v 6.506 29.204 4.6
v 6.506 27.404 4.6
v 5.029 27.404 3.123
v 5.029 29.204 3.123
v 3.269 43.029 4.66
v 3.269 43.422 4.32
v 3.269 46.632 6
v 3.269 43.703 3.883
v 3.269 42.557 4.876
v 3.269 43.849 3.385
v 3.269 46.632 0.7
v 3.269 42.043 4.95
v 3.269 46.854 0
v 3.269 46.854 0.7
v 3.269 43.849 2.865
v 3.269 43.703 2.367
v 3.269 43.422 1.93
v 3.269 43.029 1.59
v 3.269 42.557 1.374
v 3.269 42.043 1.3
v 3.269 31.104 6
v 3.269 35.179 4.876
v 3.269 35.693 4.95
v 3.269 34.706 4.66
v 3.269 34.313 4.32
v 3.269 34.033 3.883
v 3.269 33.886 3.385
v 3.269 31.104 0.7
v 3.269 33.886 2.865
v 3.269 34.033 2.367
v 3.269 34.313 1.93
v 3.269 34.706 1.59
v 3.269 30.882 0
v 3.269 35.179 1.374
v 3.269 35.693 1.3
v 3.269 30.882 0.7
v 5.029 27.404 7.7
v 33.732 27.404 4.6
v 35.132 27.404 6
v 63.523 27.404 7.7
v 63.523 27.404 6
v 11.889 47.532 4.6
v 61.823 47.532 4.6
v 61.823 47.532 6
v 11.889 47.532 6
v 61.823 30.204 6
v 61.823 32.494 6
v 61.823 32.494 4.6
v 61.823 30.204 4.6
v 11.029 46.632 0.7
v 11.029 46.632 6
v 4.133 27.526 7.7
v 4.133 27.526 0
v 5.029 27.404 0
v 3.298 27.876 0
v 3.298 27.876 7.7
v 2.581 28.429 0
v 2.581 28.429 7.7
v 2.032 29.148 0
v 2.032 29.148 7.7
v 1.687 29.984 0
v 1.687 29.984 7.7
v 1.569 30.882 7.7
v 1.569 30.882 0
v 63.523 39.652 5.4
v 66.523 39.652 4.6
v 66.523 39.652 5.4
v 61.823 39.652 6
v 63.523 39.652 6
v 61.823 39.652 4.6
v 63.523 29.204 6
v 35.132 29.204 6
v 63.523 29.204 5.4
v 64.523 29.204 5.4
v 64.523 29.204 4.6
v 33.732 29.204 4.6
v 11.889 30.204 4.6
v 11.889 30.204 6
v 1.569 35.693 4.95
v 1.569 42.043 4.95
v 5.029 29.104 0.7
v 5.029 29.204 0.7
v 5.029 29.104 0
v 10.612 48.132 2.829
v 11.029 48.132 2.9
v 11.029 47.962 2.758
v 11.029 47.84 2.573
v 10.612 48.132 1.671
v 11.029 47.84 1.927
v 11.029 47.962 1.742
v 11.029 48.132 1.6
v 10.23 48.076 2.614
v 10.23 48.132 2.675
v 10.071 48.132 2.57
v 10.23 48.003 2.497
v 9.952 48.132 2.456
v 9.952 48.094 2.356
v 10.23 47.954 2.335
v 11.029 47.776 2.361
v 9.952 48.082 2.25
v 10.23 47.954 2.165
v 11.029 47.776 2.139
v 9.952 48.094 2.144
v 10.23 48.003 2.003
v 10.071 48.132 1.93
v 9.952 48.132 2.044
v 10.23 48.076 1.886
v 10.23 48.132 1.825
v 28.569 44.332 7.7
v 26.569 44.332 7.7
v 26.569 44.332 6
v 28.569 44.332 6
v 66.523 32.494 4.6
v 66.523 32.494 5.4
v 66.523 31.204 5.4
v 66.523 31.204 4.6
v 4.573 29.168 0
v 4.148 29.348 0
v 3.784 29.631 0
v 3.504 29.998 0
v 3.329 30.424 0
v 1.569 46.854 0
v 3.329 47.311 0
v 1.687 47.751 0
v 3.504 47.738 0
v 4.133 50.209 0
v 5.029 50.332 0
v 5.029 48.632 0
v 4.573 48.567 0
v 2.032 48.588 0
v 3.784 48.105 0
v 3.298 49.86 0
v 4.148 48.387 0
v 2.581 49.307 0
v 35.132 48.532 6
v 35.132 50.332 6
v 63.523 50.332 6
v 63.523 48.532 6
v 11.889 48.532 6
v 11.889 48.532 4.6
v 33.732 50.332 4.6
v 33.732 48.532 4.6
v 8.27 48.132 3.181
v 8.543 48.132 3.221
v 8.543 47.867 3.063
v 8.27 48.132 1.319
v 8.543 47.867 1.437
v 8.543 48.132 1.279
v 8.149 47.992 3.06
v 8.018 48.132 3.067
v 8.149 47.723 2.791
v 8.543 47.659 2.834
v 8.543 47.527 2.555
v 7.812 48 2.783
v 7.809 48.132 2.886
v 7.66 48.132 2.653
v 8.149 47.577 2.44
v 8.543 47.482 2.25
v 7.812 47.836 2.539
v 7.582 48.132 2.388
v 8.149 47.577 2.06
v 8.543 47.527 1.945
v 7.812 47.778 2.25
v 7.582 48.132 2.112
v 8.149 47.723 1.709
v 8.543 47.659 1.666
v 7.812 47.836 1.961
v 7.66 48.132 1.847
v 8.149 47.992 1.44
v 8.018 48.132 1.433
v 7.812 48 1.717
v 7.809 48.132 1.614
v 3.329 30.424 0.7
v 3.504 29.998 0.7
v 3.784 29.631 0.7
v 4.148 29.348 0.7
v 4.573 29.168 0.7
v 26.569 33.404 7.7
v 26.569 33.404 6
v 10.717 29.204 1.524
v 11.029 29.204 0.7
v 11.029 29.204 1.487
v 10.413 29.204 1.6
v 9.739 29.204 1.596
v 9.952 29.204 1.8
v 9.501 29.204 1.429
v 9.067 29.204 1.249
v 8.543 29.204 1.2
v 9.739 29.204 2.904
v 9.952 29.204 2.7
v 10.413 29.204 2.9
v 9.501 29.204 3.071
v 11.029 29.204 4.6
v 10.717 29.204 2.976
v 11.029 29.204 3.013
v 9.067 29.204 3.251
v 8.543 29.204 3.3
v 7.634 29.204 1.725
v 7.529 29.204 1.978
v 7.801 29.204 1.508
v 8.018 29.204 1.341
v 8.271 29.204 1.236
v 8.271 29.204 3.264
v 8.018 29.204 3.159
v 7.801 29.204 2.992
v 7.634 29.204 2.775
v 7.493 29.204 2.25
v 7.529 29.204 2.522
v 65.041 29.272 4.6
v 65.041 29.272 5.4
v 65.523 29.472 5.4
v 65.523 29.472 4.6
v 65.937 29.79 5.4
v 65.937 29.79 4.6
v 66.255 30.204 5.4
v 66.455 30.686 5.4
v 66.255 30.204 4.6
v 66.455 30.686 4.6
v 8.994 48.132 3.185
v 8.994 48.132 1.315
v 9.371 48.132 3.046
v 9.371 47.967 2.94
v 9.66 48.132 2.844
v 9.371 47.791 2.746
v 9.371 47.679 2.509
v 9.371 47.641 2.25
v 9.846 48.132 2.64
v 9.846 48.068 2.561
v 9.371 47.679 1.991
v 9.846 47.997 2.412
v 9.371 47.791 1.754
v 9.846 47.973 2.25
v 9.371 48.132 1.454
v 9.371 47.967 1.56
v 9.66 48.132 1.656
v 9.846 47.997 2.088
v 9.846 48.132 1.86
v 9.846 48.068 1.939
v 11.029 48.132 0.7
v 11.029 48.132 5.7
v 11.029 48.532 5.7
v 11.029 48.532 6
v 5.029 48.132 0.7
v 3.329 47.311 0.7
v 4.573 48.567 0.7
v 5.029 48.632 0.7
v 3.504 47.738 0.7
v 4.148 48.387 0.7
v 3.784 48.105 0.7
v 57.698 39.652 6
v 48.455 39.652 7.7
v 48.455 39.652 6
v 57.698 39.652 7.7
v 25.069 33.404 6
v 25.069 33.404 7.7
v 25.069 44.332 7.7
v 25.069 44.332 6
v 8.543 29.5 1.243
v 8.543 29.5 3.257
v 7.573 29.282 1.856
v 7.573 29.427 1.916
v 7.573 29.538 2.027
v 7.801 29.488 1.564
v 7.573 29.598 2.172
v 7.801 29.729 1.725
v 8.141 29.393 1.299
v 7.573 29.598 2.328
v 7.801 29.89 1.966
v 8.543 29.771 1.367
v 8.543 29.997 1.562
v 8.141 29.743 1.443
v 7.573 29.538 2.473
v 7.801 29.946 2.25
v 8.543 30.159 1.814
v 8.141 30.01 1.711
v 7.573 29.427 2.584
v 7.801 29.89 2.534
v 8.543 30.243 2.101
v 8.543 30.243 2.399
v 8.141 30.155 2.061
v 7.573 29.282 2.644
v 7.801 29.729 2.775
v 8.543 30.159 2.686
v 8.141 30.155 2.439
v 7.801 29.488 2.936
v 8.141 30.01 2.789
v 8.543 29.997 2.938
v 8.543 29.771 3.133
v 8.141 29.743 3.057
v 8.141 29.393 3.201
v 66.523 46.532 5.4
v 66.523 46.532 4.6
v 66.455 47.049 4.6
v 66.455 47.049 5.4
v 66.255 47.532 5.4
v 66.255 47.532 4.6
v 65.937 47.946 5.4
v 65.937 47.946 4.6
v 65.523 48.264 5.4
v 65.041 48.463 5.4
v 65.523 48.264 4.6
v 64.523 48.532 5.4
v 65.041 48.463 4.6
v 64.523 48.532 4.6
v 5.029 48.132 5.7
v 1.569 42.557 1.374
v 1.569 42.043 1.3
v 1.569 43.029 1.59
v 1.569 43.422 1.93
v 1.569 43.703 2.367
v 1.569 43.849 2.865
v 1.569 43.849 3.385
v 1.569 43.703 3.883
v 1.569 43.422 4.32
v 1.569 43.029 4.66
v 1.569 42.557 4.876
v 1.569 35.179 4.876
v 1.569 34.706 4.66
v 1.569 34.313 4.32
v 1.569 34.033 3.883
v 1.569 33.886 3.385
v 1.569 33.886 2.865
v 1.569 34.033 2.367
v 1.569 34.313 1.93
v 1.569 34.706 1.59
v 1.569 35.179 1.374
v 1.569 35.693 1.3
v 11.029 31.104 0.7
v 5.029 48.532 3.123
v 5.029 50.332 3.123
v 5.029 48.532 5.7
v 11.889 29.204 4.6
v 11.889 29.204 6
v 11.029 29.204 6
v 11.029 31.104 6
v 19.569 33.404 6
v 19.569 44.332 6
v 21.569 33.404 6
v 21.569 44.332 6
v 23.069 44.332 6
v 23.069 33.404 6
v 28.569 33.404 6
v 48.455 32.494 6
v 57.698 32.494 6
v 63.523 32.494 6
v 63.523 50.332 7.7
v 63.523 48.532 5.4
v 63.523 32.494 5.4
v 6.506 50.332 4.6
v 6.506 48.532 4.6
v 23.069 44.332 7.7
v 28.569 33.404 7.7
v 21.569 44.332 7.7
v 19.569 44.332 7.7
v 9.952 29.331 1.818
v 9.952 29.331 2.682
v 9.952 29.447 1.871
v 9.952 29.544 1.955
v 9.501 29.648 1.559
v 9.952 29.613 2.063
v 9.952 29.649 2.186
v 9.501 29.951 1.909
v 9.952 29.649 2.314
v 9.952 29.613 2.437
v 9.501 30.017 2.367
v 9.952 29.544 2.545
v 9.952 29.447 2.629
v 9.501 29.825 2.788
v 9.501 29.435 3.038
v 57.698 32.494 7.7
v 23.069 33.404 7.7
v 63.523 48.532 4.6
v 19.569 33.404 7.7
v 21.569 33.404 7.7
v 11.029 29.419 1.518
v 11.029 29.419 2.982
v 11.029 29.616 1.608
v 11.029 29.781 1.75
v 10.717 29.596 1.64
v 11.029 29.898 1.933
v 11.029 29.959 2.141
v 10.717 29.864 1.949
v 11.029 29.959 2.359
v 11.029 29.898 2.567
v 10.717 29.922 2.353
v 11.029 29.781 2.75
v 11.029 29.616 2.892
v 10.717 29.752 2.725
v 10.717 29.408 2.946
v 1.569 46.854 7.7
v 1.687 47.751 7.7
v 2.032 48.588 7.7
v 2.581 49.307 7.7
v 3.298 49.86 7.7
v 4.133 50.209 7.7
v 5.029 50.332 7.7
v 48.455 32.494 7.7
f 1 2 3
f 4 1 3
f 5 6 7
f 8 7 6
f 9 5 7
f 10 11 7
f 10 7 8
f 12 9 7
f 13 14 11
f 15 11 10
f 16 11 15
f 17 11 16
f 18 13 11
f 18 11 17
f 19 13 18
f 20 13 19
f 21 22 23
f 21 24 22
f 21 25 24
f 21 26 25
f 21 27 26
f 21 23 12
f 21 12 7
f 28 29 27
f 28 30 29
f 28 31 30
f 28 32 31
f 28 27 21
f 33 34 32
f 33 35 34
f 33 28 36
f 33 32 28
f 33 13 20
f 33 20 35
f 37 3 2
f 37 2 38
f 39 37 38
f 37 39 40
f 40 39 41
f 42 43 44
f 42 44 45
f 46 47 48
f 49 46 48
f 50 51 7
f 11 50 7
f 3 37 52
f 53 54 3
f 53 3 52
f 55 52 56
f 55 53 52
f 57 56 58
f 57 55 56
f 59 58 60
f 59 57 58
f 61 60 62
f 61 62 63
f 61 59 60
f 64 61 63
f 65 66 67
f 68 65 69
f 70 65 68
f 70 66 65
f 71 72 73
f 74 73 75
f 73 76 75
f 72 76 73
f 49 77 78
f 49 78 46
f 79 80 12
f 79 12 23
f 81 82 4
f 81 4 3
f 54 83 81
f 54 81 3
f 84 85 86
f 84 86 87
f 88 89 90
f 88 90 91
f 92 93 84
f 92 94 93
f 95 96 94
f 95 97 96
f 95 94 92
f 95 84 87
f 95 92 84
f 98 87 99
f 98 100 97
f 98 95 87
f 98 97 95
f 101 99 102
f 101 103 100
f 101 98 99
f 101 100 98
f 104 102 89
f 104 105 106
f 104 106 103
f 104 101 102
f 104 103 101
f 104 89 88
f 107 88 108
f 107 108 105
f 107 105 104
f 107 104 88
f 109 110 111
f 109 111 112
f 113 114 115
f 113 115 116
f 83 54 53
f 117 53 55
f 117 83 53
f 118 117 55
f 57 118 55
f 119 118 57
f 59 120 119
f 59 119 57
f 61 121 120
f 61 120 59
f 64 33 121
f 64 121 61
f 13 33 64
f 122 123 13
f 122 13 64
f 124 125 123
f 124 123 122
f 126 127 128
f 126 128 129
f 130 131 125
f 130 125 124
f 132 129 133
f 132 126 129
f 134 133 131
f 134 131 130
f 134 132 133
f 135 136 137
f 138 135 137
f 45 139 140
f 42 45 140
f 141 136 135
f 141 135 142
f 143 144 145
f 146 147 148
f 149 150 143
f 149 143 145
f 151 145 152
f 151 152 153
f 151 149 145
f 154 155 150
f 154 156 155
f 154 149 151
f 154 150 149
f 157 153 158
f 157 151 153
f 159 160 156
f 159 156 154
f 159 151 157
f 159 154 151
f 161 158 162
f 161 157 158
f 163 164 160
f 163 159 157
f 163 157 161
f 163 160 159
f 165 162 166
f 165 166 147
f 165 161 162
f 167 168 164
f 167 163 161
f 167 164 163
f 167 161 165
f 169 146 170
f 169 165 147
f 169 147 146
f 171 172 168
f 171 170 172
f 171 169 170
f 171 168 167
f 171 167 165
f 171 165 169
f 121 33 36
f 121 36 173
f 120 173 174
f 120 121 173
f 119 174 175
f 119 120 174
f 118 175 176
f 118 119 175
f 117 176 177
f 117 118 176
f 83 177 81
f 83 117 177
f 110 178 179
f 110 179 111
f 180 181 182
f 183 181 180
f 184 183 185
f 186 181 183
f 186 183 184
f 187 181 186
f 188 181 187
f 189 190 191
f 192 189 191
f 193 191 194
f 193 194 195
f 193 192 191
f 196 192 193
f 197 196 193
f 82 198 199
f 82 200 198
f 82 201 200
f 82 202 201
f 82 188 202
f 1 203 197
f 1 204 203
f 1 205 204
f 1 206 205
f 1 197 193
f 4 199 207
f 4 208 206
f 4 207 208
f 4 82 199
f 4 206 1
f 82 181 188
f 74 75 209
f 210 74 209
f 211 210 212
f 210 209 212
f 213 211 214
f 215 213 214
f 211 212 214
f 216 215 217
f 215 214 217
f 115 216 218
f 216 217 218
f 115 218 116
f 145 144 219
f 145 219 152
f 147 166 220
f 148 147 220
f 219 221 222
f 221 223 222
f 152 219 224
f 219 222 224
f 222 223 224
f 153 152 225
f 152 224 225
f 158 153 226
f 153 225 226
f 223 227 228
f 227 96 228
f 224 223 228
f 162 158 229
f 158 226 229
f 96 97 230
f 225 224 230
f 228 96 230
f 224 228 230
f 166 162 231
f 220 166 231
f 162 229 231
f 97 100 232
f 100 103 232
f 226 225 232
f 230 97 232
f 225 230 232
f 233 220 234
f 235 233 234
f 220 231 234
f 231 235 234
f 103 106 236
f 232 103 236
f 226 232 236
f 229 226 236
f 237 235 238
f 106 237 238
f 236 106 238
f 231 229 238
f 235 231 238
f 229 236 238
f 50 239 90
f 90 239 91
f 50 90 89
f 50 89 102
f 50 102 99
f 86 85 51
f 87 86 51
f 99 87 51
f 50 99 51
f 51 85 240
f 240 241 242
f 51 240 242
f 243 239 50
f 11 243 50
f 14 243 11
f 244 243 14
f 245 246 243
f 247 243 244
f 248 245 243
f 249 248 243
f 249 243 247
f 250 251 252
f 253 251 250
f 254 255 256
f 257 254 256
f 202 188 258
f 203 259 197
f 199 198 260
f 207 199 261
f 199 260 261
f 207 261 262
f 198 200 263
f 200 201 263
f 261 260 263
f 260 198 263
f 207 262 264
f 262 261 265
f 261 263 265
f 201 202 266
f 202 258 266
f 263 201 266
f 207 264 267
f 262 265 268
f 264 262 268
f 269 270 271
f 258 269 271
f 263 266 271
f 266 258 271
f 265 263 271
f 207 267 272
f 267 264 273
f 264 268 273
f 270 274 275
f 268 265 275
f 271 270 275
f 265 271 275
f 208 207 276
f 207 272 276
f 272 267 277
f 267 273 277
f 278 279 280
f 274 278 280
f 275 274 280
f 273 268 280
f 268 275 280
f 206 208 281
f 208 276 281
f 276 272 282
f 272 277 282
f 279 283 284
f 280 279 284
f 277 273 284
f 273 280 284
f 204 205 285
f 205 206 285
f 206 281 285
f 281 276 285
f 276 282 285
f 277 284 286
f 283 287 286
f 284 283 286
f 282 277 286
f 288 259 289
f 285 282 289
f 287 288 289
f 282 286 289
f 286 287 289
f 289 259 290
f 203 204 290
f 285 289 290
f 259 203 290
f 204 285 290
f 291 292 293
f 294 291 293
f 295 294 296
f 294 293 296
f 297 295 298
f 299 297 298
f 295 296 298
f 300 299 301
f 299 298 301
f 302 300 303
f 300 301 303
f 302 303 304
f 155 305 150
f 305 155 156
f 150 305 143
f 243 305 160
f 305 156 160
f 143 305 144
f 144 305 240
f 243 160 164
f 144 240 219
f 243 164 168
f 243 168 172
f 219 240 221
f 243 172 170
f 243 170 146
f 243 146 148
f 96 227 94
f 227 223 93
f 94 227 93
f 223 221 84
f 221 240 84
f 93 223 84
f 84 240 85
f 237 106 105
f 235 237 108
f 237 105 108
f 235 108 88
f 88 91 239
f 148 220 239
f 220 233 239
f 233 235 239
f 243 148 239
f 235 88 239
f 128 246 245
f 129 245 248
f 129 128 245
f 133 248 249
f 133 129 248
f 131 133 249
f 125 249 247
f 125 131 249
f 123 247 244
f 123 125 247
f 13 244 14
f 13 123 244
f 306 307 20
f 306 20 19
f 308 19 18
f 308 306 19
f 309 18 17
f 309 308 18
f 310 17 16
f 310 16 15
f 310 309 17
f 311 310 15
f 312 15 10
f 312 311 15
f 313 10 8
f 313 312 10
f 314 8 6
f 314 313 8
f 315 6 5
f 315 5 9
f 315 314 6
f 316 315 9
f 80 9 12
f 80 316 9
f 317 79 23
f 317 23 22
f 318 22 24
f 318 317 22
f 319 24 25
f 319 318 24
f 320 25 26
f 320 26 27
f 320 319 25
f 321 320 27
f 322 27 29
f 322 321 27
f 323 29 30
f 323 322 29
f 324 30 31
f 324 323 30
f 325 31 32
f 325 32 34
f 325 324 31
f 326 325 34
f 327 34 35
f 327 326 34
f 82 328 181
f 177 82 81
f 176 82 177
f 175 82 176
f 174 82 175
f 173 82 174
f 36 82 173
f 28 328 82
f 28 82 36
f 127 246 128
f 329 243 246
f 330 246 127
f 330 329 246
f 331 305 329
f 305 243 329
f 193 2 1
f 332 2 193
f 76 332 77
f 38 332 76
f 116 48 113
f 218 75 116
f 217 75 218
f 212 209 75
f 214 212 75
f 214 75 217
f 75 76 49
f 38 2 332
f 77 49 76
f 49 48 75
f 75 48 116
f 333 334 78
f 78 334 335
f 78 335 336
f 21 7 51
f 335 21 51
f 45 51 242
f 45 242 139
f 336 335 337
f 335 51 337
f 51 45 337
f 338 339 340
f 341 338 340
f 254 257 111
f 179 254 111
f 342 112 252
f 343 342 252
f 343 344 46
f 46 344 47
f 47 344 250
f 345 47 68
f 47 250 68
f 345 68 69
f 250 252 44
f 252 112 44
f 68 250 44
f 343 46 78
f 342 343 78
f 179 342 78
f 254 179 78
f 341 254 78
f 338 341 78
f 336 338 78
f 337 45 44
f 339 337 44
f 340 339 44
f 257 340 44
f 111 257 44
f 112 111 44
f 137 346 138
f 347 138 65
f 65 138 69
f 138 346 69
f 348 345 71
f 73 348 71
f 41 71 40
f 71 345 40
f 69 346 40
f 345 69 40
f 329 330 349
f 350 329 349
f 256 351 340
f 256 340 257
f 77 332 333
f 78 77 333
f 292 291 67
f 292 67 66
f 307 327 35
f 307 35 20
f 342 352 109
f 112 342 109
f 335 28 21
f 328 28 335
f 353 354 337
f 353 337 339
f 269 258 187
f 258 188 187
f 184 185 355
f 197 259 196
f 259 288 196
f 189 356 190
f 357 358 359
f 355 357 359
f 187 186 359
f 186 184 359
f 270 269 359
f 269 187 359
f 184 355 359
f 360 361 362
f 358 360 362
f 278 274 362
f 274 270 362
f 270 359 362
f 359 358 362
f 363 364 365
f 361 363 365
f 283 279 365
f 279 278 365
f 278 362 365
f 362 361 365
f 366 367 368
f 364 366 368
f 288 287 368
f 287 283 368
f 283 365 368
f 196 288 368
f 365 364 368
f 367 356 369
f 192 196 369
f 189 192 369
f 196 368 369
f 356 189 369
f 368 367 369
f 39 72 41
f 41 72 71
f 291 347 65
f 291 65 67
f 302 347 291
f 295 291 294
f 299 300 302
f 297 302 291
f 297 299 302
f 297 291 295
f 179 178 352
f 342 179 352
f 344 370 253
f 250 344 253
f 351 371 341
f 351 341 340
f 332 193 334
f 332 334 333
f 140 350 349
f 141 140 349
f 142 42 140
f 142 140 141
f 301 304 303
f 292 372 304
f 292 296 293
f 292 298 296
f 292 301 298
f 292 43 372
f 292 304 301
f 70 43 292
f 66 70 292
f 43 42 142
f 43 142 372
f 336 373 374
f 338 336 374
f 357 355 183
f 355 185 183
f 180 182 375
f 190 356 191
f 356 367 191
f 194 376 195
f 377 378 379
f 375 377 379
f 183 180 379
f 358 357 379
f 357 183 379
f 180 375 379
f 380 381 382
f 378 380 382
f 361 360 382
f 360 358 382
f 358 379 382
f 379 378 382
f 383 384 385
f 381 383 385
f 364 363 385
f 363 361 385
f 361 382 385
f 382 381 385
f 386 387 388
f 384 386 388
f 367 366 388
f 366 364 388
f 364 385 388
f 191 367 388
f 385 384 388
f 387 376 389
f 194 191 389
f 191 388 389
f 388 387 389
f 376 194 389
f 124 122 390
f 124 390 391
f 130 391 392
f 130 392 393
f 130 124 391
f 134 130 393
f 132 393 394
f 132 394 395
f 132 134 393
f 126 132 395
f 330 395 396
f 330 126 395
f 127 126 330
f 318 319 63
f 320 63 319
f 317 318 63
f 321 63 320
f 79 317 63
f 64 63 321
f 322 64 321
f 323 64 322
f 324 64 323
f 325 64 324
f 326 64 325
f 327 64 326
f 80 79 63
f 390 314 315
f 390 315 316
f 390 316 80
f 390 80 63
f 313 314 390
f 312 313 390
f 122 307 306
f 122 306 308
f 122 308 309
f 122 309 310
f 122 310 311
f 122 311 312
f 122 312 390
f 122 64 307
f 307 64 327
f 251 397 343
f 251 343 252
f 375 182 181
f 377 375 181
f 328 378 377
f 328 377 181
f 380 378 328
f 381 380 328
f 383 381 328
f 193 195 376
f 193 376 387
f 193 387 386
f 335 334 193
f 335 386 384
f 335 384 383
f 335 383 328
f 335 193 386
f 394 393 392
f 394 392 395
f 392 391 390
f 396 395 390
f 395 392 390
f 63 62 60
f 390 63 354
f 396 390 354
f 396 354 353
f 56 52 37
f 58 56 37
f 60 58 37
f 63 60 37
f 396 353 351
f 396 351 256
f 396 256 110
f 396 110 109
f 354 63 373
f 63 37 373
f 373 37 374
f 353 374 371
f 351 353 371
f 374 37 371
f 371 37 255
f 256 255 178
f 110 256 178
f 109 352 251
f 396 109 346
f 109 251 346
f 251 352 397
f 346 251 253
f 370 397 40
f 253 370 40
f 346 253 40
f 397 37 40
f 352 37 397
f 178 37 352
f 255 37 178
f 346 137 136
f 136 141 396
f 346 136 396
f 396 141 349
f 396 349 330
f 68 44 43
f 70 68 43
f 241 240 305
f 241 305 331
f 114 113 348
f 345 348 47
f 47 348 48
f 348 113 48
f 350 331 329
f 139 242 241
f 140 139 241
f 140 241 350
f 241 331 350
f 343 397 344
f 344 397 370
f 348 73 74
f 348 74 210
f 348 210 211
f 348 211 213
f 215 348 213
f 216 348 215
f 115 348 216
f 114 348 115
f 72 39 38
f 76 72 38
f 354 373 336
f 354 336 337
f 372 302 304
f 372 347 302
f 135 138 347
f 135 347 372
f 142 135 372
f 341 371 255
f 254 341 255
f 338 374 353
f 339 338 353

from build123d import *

# Parameters (mm, degrees)
BOSS_EXTRUDE2_DEPTH       = 7.7
BOSS_EXTRUDE3_DEPTH       = 58.493998982
BOSS_EXTRUDE4_REACH       = 69.972
SKETCH7_W                 = 6
SKETCH7_H                 = 7
BOSS_EXTRUDE5_DEPTH       = 1.9
SKETCH9_W                 = 5
SKETCH9_H                 = 0.4
CUT_EXTRUDE1_DEPTH        = 6
SKETCH10_W                = 51.633694728
SKETCH10_H                = 3.1
BOSS_EXTRUDE6_DEPTH       = 1
MIRROR1_START             = 27.403764687
MIRROR1_DEPTH             = 2.800044537
MIRROR1_START_2           = 29.203809224
MIRROR1_2_DEPTH           = 1
MIRROR1_START_3           = 30.203809224
MIRROR1_3_OUTLINE_W       = 6
MIRROR1_3_OUTLINE_H       = 7
MIRROR1_3_DEPTH           = 0.9
MIRROR1_4_OUTLINE_W       = 0.860304254
MIRROR1_4_OUTLINE_H       = 3.1
MIRROR1_4_DEPTH           = 1.800044537
MIRROR1_START_4           = 5.029168405
MIRROR1_5_OUTLINE_W       = 1
MIRROR1_5_OUTLINE_H       = 3.9
MIRROR1_5_DEPTH           = 6
BOSS_EXTRUDE7_START       = -1.7
BOSS_EXTRUDE7_DEPTH       = 1.7
BOSS_EXTRUDE12_DEPTH      = 3
BOSS_EXTRUDE12_DEPTH_BACK = 1.7
SKETCH14_W                = 1.4
SKETCH14_H                = 19.327817751
FILLET1_R                 = 2
CUT_EXTRUDE2_DEPTH        = 0.6
CUT_EXTRUDE3_DEPTH        = 1.7
SKETCH18_W                = 2
SKETCH18_H                = 2.1
BOSS_EXTRUDE13_DEPTH      = 5.3
SKETCH19_W                = 9.243692919
SKETCH19_H                = 7.158225614
CUT_EXTRUDE4_DEPTH        = 1.7
SKETCH20_W                = 4.7
SKETCH20_H                = 7.158225614
CUT_EXTRUDE5_DEPTH        = 1.4
SKETCH21_W                = 2
SKETCH21_H                = 10.927906825
CUT_EXTRUDE6_DEPTH        = 84.772901086


with BuildPart() as part:
    # Sketch1 → Boss-Extrude2 (new body)
    with BuildSketch(Plane.XY):
        with BuildLine():
            Line((1.569168405, 30.881718108), (1.569168405, 46.853718091))
            ThreePointArc((1.569168405, 46.853718091), (2.581495272, 49.306663259), (5.029168405, 50.331671512))
            Line((5.029168405, 50.331671512), (5.029168405, 48.631626975))
            ThreePointArc((5.029168405, 48.631626975), (3.783584613, 48.104573798), (3.269168405, 46.853718091))
            Line((3.269168405, 46.853718091), (3.269168405, 30.881718108))
            ThreePointArc((3.269168405, 30.881718108), (3.783584613, 29.630862401), (5.029168405, 29.103809224))
            Line((5.029168405, 29.103809224), (5.029168405, 27.403764687))
            ThreePointArc((5.029168405, 27.403764687), (2.581495272, 28.428772939), (1.569168405, 30.881718108))
        make_face()
    extrude(amount=BOSS_EXTRUDE2_DEPTH)

    # Sketch3 → Boss-Extrude3 (add)
    with BuildSketch(Plane(origin=(5.029168405, 0, 0), x_dir=(0, 0, -1), z_dir=(1, 0, 0))):
        Polygon((-7.7, 48.631626975), (-7.7, 50.331671512), (-6.1, 50.331671512), (-6.1, 48.631626975), (-6.1, 48.531626975), (-7.7, 48.531626975), align=None)
    extrude(amount=BOSS_EXTRUDE3_DEPTH)

    # Boss-Extrude4: up to this face of the body (flat: up to its plane)
    boss_extrude4_end = Plane(part.part.faces().sort_by_distance((34.276167896, 48.531626975, 6.9))[0])
    # Sketch4 → Boss-Extrude4 (add, up to the picked face)
    with BuildSketch(Plane(origin=(0, 50.331671512, 0), x_dir=(1, 0, 0), z_dir=(0, 1, 0)), mode=Mode.PRIVATE) as boss_extrude4_sk1:
        Polygon((35.231704884, -6.1), (5.029168405, -6.1), (5.029168405, -3.123421356), (6.505747049, -4.6), (33.731704884, -4.6), (35.202415562, -6.070710678), align=None)
    boss_extrude4_tool1 = split(extrude(boss_extrude4_sk1.sketch, amount=-BOSS_EXTRUDE4_REACH, mode=Mode.PRIVATE), bisect_by=boss_extrude4_end, keep=Keep.BOTH, mode=Mode.PRIVATE)
    add(boss_extrude4_tool1.solids().sort_by(Axis((19.415766, 50.331672, 5.326299), (0, -1, 0)))[0])

    # Sketch7 → Boss-Extrude5 (add)
    with BuildSketch(Plane.XZ.offset(-48.531626975)):
        with Locations((8.029168405, 4.2)):
            Rectangle(SKETCH7_W, SKETCH7_H)
    extrude(amount=BOSS_EXTRUDE5_DEPTH)

    # Sketch8 → Cut-Revolve1 (revolve, cut)
    with BuildSketch(Plane(origin=(0, 48.531626975, 0), x_dir=(1, 0, 0), z_dir=(0, 1, 0))):
        with BuildLine():
            Line((7.493162671, -2.25), (9.593162671, -2.25))
            Line((9.593162671, -2.25), (11.029168405, -2.25))
            Line((11.029168405, -2.25), (11.029168405, -3.013237094))
            add(Edge.make_bspline(
                [(11.029168405, -3.013237094), (10.455622255, -2.979221008), (9.952164105, -2.7)],
                knots=[0, 0, 0, 1, 1, 1], degree=2))
            add(Edge.make_bspline(
                [(8.543162671, -3.3), (9.366293549, -3.339525323), (9.952164105, -2.7)],
                knots=[0, 0, 0, 1, 1, 1], degree=2))
            ThreePointArc((8.543162671, -3.3), (7.800700551, -2.99246212), (7.493162671, -2.25))
        make_face()
    revolve(axis=Axis((7.493162671, 48.531626975, 2.25), (1, 0, 0)), mode=Mode.SUBTRACT)

    # Sketch9 → Cut-Extrude1 (cut)
    with BuildSketch(Plane(origin=(11.029168405, 0, 0), x_dir=(0, 0, -1), z_dir=(1, 0, 0))):
        with Locations((-3.2, 48.331626975)):
            Rectangle(SKETCH9_W, SKETCH9_H)
    extrude(amount=-CUT_EXTRUDE1_DEPTH, mode=Mode.SUBTRACT)

    # Sketch10 → Boss-Extrude6 (add)
    with BuildSketch(Plane(origin=(0, 48.531626975, 0), x_dir=(-1, 0, 0), z_dir=(0, -1, 0))):
        with Locations((-37.706320023, -6.15)):
            Rectangle(SKETCH10_W, SKETCH10_H)
    extrude(amount=BOSS_EXTRUDE6_DEPTH)

    # Mirror1: read off the stored shape, not the designer's step
    # Mirror1 outline → Mirror1 (add)
    with BuildSketch(Plane(origin=(0, 0, 0), x_dir=(1, 0, 0), z_dir=(0, 1, 0)).offset(MIRROR1_START)):
        Polygon((63.523167387, -7.7), (63.523167387, -6.1), (35.231704884, -6.1), (33.731704884, -4.6), (11.889472659, -4.6), (11.889472659, -7.7), align=None)
        Polygon((5.029168405, -7.7), (11.029168405, -7.7), (11.029168405, -4.6), (6.505747049, -4.6), (5.029168405, -3.123421356), align=None)
    extrude(amount=MIRROR1_DEPTH)

    # Mirror1 2 outline → Mirror1 2 (add)
    with BuildSketch(Plane(origin=(0, 0, 0), x_dir=(1, 0, 0), z_dir=(0, 1, 0)).offset(MIRROR1_START_2)):
        Polygon((35.231704884, -6.1), (63.523167387, -6.1), (63.523167387, -4.6), (33.731704884, -4.6), align=None)
    extrude(amount=MIRROR1_2_DEPTH)

    # Mirror1 3 outline → Mirror1 3 (add)
    with BuildSketch(Plane(origin=(0, 0, 0), x_dir=(1, 0, 0), z_dir=(0, 1, 0)).offset(MIRROR1_START_3)):
        with Locations((8.029168405, -4.2)):
            Rectangle(MIRROR1_3_OUTLINE_W, MIRROR1_3_OUTLINE_H)
    extrude(amount=MIRROR1_3_DEPTH)

    # Mirror1 4 outline → Mirror1 4 (add)
    with BuildSketch(Plane(origin=(0, 0, 0), x_dir=(1, 0, 0), z_dir=(0, 1, 0)).offset(MIRROR1_START)):
        with Locations((11.459320532, -6.15)):
            Rectangle(MIRROR1_4_OUTLINE_W, MIRROR1_4_OUTLINE_H)
    extrude(amount=MIRROR1_4_DEPTH)

    # Mirror1 5 outline → Mirror1 5 (add)
    with BuildSketch(Plane.YZ.offset(MIRROR1_START_4)):
        with Locations((29.703809224, 2.65)):
            Rectangle(MIRROR1_5_OUTLINE_W, MIRROR1_5_OUTLINE_H)
    extrude(amount=MIRROR1_5_DEPTH)

    # Mirror1 6 outline → Mirror1 6 (revolve, cut)
    with BuildSketch(Plane(origin=(0, 29.203809224, 2.25), x_dir=(0, 1, 0), z_dir=(0, 0, -1))):
        with BuildLine():
            add(Edge.make_bspline(
                [(0.45, 9.952164105), (0.729221008, 10.455622255), (0.763237094, 11.029168405)],
                knots=[0, 0, 0, 1, 1, 1], degree=2))
            Line((0.763237094, 11.029168405), (0, 11.029168505))
            Line((0, 11.029168505), (0, 7.493162671))
            ThreePointArc((0, 7.493162671), (0.74246212, 7.800700551), (1.05, 8.543162671))
            add(Edge.make_bspline(
                [(1.05, 8.543162671), (1.089525323, 9.366293549), (0.45, 9.952164105)],
                knots=[0, 0, 0, 1, 1, 1], degree=2))
        make_face()
    revolve(axis=Axis((0, 29.203809224, 2.25), (1, 0, 0)), mode=Mode.SUBTRACT)

    # Sketch12 → Boss-Extrude7 (add)
    with BuildSketch(Plane.XY.offset(7.7).offset(BOSS_EXTRUDE7_START)):
        with BuildLine():
            Line((63.523167387, 50.331671512), (5.029168405, 50.331671512))
            ThreePointArc((5.029168405, 50.331671512), (2.581495272, 49.306663259), (1.569168405, 46.853718091))
            Line((1.569168405, 46.853718091), (1.569168405, 30.881718108))
            ThreePointArc((1.569168405, 30.881718108), (2.581495272, 28.428772939), (5.029168405, 27.403764687))
            Line((5.029168405, 27.403764687), (63.523167387, 27.403764687))
            Line((63.523167387, 27.403764687), (63.523167387, 50.331671512))
        make_face()
    extrude(amount=BOSS_EXTRUDE7_DEPTH)

    # Sketch14 → Boss-Extrude12 (add, two sides: drawn at the far end of the back side and taken through both)
    with BuildSketch(Plane(origin=(63.523167387, 0, 0), x_dir=(0, 0, -1), z_dir=(1, 0, 0)).offset(-BOSS_EXTRUDE12_DEPTH_BACK)):
        with Locations((-5.3, 38.8677181)):
            Rectangle(SKETCH14_W, SKETCH14_H)
    extrude(amount=BOSS_EXTRUDE12_DEPTH + BOSS_EXTRUDE12_DEPTH_BACK)

    # Fillet1
    fillet1_edges = [part.edges().sort_by_distance(p)[0] for p in [
        (66.523167387, 48.531626975, 5.3),
        (66.523167387, 29.203809224, 5.3),
    ]]
    fillet(fillet1_edges, radius=FILLET1_R)

    # Sketch15 → Cut-Extrude2 (cut)
    with BuildSketch(Plane.XY.offset(6)):
        with BuildLine():
            Line((63.523167387, 29.203809224), (64.523167387, 29.203809224))
            ThreePointArc((64.523167387, 29.203809224), (65.937380949, 29.789595662), (66.523167387, 31.203809224))
            Line((66.523167387, 31.203809224), (66.523167387, 46.531626975))
            ThreePointArc((66.523167387, 46.531626975), (65.937380949, 47.945840537), (64.523167387, 48.531626975))
            Line((64.523167387, 48.531626975), (63.523167387, 48.531626975))
            Line((63.523167387, 48.531626975), (63.523167387, 29.203809224))
        make_face()
    extrude(amount=-CUT_EXTRUDE2_DEPTH, mode=Mode.SUBTRACT)

    # Sketch16 → Cut-Extrude3 (cut)
    with BuildSketch(Plane.ZY.offset(-1.569168405)):
        with BuildLine():
            Line((1.3, 35.692718099), (1.3, 42.042718099))
            ThreePointArc((1.3, 42.042718099), (3.125, 43.867718099), (4.95, 42.042718099))
            Line((4.95, 42.042718099), (4.95, 35.692718099))
            ThreePointArc((4.95, 35.692718099), (3.125, 33.867718099), (1.3, 35.692718099))
        make_face()
    extrude(amount=-CUT_EXTRUDE3_DEPTH, mode=Mode.SUBTRACT)

    # Sketch18 → Boss-Extrude13 (add)
    with BuildSketch(Plane(origin=(0, 0, 6), x_dir=(-1, 0, 0), z_dir=(0, 0, -1))):
        with Locations((-4.029168405, 47.681626975)):
            Rectangle(SKETCH18_W, SKETCH18_H)
        with Locations((-4.029168405, 30.053809224)):
            Rectangle(SKETCH18_W, SKETCH18_H)
    extrude(amount=BOSS_EXTRUDE13_DEPTH)

    # Sketch19 → Cut-Extrude4 (cut)
    with BuildSketch(Plane.XY.offset(7.7)):
        with Locations((53.076601752, 36.072643067)):
            Rectangle(SKETCH19_W, SKETCH19_H)
    extrude(amount=-CUT_EXTRUDE4_DEPTH, mode=Mode.SUBTRACT)

    # Sketch20 → Cut-Extrude5 (cut)
    with BuildSketch(Plane(origin=(0, 0, 4.6), x_dir=(-1, 0, 0), z_dir=(0, 0, -1))):
        with Locations((-64.173167387, 36.072643067)):
            Rectangle(SKETCH20_W, SKETCH20_H)
    extrude(amount=-CUT_EXTRUDE5_DEPTH, mode=Mode.SUBTRACT)

    # Sketch21 → Cut-Extrude6 (cut, through all)
    with BuildSketch(Plane.XY.offset(7.7)):
        with Locations((20.569168405, 38.867718099)):
            Rectangle(SKETCH21_W, SKETCH21_H)
        with Locations((24.069168405, 38.867718099)):
            Rectangle(SKETCH21_W, SKETCH21_H)
        with Locations((27.569168405, 38.867718099)):
            Rectangle(SKETCH21_W, SKETCH21_H)
    extrude(amount=-CUT_EXTRUDE6_DEPTH, mode=Mode.SUBTRACT)


solid = part.part
